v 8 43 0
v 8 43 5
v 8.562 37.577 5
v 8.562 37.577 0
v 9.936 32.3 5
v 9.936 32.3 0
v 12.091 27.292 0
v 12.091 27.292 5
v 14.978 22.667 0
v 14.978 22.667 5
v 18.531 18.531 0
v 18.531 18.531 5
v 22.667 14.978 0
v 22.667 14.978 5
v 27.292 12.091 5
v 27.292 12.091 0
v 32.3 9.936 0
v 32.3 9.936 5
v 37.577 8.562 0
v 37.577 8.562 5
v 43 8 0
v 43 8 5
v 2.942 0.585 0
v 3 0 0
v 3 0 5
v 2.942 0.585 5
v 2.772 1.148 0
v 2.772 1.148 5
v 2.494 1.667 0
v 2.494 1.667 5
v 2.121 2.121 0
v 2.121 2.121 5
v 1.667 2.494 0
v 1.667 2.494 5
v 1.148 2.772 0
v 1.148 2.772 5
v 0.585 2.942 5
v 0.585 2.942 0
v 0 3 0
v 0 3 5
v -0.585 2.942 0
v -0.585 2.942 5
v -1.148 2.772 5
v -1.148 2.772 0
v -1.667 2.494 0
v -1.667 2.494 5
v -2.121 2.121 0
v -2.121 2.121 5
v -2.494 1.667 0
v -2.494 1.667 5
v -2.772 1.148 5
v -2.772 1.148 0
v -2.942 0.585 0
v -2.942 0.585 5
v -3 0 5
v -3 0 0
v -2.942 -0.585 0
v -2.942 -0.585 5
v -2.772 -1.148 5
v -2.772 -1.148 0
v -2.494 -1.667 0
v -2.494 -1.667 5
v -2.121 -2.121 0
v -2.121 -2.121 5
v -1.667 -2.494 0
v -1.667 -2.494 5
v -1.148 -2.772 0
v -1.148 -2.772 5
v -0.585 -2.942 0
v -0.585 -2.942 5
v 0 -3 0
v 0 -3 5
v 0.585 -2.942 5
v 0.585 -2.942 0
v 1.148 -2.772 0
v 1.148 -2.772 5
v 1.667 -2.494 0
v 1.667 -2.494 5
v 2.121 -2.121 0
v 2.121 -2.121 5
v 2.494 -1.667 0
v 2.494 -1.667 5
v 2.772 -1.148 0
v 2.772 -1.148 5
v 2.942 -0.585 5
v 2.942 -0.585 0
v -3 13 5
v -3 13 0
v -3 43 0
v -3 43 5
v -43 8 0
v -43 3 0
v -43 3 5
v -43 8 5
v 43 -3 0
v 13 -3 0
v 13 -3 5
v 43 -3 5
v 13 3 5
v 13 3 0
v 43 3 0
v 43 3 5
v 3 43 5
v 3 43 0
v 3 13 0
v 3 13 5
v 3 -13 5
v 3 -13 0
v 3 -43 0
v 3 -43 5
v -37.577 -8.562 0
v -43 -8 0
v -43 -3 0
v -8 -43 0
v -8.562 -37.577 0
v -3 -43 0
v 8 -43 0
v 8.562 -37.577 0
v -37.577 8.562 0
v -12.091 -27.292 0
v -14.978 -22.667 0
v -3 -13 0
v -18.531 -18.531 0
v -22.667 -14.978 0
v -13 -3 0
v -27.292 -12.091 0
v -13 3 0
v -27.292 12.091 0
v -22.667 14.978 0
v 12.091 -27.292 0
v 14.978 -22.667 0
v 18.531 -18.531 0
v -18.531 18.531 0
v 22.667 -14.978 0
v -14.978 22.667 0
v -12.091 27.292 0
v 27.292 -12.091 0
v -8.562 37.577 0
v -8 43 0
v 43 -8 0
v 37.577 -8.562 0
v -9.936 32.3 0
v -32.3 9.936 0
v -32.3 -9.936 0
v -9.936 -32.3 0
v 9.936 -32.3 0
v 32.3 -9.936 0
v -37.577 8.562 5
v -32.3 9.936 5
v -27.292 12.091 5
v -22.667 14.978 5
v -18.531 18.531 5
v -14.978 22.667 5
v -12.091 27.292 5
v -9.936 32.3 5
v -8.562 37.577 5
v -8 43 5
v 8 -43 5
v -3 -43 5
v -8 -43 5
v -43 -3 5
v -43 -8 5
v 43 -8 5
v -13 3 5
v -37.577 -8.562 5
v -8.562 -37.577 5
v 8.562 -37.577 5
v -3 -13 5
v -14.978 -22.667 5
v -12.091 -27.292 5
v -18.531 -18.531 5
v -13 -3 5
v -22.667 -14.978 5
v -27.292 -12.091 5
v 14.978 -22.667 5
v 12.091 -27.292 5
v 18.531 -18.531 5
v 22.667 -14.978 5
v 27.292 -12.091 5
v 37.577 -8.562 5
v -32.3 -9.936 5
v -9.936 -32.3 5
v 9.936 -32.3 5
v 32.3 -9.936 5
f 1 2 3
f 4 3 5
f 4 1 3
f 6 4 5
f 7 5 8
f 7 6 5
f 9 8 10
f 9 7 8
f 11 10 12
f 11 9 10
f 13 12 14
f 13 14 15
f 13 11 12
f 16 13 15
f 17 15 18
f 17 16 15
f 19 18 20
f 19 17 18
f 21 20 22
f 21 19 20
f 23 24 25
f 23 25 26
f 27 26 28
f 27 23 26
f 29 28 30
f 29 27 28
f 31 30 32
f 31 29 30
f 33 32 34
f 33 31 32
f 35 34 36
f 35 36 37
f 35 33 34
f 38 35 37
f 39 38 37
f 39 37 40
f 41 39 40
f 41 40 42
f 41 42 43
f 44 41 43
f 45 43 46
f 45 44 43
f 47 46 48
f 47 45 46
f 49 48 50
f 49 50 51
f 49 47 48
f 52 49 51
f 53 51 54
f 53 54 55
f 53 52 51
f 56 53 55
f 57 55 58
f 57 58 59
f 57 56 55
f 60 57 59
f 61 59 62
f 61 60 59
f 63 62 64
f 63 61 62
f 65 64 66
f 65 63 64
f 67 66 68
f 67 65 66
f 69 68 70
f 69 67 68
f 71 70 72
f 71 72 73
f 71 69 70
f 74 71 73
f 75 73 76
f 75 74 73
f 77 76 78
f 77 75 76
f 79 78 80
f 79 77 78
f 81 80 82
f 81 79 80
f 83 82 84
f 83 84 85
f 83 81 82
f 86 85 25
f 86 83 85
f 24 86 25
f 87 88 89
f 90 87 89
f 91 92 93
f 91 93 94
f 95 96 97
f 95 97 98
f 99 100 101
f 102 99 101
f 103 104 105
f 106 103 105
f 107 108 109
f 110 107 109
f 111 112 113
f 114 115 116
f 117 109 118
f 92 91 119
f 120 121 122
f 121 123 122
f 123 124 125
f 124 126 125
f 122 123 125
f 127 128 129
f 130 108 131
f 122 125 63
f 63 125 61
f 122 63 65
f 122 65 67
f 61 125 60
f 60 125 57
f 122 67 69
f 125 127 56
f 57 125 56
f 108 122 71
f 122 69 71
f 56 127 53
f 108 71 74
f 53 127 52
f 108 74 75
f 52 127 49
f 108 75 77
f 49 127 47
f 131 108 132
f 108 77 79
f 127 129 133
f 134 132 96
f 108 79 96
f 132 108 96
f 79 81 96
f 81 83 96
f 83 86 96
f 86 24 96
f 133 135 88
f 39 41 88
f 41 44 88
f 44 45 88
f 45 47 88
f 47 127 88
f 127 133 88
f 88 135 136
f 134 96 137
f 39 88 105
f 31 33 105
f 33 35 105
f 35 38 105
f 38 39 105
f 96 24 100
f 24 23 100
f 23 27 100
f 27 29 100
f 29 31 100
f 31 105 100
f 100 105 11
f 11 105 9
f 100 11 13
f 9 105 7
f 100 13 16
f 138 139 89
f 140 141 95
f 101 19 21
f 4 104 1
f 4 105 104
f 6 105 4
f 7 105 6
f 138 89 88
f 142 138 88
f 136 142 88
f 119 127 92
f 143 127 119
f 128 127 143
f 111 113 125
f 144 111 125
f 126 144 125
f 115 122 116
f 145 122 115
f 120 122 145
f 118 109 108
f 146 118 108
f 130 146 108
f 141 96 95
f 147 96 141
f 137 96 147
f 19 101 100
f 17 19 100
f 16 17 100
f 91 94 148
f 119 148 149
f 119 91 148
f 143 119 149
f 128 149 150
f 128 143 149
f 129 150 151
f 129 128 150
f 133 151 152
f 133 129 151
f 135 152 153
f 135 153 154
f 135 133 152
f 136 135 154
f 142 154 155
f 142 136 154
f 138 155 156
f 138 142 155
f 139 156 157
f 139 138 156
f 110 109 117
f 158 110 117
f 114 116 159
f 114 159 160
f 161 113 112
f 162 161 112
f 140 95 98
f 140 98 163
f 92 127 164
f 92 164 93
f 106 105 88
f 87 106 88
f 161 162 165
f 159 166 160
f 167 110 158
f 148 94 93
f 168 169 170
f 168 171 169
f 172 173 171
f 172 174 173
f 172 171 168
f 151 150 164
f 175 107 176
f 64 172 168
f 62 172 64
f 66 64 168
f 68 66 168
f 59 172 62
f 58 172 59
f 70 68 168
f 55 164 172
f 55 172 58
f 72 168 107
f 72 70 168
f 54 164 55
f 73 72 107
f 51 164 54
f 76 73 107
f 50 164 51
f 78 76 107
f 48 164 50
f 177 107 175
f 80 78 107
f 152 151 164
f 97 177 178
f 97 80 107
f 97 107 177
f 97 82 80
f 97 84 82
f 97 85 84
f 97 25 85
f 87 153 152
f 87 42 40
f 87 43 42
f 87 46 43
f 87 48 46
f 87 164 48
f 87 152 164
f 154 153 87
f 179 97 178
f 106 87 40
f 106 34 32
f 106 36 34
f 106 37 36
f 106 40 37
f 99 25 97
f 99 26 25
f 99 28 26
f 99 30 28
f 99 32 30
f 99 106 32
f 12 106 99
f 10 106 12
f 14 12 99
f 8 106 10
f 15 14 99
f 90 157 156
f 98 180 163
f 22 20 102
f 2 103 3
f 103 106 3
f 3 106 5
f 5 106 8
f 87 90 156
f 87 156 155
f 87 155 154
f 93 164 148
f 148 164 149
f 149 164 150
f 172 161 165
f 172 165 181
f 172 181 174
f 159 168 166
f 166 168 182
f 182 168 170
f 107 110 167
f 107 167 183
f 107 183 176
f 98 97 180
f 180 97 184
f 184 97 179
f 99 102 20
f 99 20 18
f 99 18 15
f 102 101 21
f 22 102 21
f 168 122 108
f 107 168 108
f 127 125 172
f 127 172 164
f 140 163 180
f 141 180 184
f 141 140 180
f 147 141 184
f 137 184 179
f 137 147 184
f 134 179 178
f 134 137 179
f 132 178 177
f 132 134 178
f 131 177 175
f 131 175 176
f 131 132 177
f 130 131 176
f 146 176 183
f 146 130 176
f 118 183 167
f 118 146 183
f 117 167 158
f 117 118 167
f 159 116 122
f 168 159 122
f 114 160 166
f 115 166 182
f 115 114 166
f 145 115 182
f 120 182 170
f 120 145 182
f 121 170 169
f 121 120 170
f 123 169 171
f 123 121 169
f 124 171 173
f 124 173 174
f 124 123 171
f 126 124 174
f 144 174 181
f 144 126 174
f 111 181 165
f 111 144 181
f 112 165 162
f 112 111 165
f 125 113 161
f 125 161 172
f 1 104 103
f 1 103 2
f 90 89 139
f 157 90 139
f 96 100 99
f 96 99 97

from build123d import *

# Parameters (mm, degrees)
SKETCH_R  = 3
PAD_DEPTH = 5


with BuildPart() as part:
    # Sketch → Pad (new body)
    with BuildSketch(Plane.XY):
        with BuildLine():
            Line((3, 43), (3, 13))
            Line((3, 13), (-3, 13))
            Line((-3, 13), (-3, 43))
            Line((-3, 43), (-8, 43))
            ThreePointArc((-43, 8), (-18.530637, 18.530637), (-8, 43))
            Line((-43, 3), (-43, 8))
            Line((-13, 3), (-43, 3))
            Line((-13, -3), (-13, 3))
            Line((-43, -3), (-13, -3))
            Line((-43, -3), (-43, -8))
            ThreePointArc((-8, -43), (-18.530637, -18.530637), (-43, -8))
            Line((-3, -43), (-8, -43))
            Line((-3, -43), (-3, -13))
            Line((-3, -13), (3, -13))
            Line((3, -13), (3, -43))
            Line((3, -43), (8, -43))
            ThreePointArc((43, -8), (18.530637, -18.530637), (8, -43))
            Line((43, -3), (43, -8))
            Line((13, -3), (43, -3))
            Line((13, 3), (13, -3))
            Line((13, 3), (43, 3))
            Line((43, 3), (43, 8))
            ThreePointArc((8, 43), (18.530637, 18.530637), (43, 8))
            Line((3, 43), (8, 43))
        make_face()
        Circle(SKETCH_R, mode=Mode.SUBTRACT)
    extrude(amount=PAD_DEPTH)


solid = part.part
